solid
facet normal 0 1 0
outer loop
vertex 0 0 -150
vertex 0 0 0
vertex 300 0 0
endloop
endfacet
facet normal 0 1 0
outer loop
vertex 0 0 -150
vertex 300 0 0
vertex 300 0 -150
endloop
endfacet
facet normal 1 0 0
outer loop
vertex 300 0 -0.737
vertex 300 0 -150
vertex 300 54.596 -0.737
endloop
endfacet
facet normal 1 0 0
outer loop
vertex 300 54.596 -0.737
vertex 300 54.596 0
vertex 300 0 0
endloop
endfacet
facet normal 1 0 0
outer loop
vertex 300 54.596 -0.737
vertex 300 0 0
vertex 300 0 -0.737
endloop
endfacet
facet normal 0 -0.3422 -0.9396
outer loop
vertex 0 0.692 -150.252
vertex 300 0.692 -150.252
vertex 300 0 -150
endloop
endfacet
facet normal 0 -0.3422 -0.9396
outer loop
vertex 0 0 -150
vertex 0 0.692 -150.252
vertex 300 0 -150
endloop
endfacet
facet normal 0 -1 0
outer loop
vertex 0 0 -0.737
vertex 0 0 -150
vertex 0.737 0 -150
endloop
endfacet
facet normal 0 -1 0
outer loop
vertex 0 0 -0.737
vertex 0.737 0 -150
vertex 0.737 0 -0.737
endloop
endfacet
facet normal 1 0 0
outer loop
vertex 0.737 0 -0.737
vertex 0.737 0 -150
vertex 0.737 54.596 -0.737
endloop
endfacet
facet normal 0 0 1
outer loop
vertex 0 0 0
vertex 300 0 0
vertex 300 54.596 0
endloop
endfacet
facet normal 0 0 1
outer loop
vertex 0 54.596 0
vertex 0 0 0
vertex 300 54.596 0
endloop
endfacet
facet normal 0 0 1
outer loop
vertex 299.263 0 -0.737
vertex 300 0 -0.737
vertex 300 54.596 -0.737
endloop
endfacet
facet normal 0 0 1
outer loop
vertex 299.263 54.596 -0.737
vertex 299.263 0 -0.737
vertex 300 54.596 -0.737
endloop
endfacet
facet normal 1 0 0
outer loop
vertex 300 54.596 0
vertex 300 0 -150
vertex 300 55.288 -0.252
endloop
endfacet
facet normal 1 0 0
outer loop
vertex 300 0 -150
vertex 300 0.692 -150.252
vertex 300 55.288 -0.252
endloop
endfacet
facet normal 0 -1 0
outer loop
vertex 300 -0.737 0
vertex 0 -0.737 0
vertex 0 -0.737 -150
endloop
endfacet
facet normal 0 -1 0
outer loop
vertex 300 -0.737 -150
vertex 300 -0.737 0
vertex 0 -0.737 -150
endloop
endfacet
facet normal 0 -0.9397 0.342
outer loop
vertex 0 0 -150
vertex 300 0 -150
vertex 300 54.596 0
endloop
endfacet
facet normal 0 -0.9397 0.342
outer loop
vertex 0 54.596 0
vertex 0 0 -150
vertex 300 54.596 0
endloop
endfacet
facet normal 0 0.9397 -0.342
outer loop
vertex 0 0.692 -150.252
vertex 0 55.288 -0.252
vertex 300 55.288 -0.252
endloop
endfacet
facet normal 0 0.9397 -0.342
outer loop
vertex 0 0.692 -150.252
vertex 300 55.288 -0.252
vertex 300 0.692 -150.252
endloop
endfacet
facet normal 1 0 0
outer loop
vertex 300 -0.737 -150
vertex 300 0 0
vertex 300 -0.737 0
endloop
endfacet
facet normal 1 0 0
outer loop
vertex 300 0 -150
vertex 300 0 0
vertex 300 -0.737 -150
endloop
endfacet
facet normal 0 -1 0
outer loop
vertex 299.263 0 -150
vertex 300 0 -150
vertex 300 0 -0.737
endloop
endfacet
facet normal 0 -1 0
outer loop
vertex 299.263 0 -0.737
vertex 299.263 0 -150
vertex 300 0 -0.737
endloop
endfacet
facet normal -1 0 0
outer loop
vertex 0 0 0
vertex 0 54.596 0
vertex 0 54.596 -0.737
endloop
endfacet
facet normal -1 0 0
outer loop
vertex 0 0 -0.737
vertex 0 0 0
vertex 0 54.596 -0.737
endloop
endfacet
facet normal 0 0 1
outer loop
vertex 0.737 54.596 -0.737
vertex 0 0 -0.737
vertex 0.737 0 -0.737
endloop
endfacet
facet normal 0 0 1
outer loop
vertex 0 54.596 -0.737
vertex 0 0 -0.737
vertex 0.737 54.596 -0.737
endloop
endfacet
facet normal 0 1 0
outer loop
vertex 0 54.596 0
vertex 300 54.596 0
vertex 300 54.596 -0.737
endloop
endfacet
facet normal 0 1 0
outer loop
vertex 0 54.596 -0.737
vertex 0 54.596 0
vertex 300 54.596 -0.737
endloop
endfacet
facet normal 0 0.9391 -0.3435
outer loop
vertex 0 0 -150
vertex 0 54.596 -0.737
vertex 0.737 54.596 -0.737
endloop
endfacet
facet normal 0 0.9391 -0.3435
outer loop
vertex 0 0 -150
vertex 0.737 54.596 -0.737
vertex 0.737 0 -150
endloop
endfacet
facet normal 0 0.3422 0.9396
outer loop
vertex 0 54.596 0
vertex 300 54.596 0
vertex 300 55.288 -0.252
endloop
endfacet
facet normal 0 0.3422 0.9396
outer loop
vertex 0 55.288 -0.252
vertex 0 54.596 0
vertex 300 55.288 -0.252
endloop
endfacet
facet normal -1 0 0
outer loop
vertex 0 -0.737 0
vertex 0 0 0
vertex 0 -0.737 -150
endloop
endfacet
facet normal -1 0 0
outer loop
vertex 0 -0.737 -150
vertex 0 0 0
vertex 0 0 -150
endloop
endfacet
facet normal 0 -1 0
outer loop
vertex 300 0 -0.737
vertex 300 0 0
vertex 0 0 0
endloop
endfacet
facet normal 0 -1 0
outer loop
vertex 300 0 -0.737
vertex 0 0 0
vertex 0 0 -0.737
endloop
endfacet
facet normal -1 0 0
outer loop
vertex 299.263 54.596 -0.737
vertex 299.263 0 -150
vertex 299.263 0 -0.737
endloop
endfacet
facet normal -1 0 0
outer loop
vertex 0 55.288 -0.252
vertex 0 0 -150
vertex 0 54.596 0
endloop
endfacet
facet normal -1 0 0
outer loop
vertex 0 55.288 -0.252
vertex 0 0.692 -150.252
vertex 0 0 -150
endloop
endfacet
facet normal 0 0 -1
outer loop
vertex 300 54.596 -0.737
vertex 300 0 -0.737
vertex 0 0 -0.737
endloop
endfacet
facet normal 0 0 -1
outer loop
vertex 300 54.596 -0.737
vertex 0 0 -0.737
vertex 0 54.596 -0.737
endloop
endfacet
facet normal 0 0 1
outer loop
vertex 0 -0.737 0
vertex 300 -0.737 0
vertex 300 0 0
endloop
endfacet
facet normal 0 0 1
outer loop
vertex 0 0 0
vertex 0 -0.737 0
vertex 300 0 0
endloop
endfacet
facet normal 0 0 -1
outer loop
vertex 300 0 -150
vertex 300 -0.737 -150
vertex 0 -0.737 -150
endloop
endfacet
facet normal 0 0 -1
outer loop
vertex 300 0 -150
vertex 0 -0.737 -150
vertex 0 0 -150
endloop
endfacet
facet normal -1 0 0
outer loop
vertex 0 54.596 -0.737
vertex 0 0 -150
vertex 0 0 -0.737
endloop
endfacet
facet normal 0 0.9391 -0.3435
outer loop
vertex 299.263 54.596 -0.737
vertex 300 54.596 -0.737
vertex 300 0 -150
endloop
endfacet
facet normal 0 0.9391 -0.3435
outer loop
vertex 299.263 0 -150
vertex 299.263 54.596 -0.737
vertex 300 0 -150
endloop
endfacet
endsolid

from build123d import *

# Parameters (mm, degrees)
SZKIC2_W               = 150
SZKIC2_H               = 0.7366
ODGI_CIE_BAZOWE1_DEPTH = 300
ODGI_CIE_BAZOWE2_DEPTH = 300
SZKIC10_W              = 0.7366
SZKIC10_H              = 54.59553514
ODGI_CIE_BAZOWE3_DEPTH = 300
ODGI_CIE_BAZOWE4_DEPTH = 0.7366
ODGI_CIE_BAZOWE5_DEPTH = 0.7366


# Sheet-metal steps are written as plain solids
with BuildPart() as part:
    # Szkic2 → Odgięcie bazowe1 (new body)
    with BuildSketch(Plane(origin=(0, 0, 0), x_dir=(0, 0, -1), z_dir=(1, 0, 0))):
        with Locations((75, -0.3683)):
            Rectangle(SZKIC2_W, SZKIC2_H)
    extrude(amount=ODGI_CIE_BAZOWE1_DEPTH)


with BuildPart() as body_2:
    # Szkic7 → Odgięcie bazowe2 (new body)
    with BuildSketch(Plane(origin=(0, 0, 0), x_dir=(0, 0, -1), z_dir=(1, 0, 0))):
        Polygon((150, 0), (0, 54.59553514), (0.251932038, 55.287712724), (150.251932038, 0.692177584), align=None)
    extrude(amount=ODGI_CIE_BAZOWE2_DEPTH)


with BuildPart() as body_3:
    # Szkic10 → Odgięcie bazowe3 (new body)
    with BuildSketch(Plane(origin=(0, 0, 0), x_dir=(0, 0, -1), z_dir=(1, 0, 0))):
        with Locations((0.3683, 27.29776757)):
            Rectangle(SZKIC10_W, SZKIC10_H)
    extrude(amount=ODGI_CIE_BAZOWE3_DEPTH)


with BuildPart() as body_4:
    # Szkic15 → Odgięcie bazowe4 (new body)
    with BuildSketch(Plane.ZY):
        Polygon((-0.7366, 54.59553514), (-150, 0), (-0.7366, 0), align=None)
    extrude(amount=-ODGI_CIE_BAZOWE4_DEPTH)


with BuildPart() as body_5:
    # Szkic18 → Odgięcie bazowe5 (new body)
    with BuildSketch(Plane(origin=(300, 0, 0), x_dir=(0, 0, -1), z_dir=(1, 0, 0))):
        Polygon((0.7366, 0), (0.7366, 54.59553514), (150, 0), align=None)
    extrude(amount=-ODGI_CIE_BAZOWE5_DEPTH)


solid = Compound([part.part, body_2.part, body_3.part, body_4.part, body_5.part])
